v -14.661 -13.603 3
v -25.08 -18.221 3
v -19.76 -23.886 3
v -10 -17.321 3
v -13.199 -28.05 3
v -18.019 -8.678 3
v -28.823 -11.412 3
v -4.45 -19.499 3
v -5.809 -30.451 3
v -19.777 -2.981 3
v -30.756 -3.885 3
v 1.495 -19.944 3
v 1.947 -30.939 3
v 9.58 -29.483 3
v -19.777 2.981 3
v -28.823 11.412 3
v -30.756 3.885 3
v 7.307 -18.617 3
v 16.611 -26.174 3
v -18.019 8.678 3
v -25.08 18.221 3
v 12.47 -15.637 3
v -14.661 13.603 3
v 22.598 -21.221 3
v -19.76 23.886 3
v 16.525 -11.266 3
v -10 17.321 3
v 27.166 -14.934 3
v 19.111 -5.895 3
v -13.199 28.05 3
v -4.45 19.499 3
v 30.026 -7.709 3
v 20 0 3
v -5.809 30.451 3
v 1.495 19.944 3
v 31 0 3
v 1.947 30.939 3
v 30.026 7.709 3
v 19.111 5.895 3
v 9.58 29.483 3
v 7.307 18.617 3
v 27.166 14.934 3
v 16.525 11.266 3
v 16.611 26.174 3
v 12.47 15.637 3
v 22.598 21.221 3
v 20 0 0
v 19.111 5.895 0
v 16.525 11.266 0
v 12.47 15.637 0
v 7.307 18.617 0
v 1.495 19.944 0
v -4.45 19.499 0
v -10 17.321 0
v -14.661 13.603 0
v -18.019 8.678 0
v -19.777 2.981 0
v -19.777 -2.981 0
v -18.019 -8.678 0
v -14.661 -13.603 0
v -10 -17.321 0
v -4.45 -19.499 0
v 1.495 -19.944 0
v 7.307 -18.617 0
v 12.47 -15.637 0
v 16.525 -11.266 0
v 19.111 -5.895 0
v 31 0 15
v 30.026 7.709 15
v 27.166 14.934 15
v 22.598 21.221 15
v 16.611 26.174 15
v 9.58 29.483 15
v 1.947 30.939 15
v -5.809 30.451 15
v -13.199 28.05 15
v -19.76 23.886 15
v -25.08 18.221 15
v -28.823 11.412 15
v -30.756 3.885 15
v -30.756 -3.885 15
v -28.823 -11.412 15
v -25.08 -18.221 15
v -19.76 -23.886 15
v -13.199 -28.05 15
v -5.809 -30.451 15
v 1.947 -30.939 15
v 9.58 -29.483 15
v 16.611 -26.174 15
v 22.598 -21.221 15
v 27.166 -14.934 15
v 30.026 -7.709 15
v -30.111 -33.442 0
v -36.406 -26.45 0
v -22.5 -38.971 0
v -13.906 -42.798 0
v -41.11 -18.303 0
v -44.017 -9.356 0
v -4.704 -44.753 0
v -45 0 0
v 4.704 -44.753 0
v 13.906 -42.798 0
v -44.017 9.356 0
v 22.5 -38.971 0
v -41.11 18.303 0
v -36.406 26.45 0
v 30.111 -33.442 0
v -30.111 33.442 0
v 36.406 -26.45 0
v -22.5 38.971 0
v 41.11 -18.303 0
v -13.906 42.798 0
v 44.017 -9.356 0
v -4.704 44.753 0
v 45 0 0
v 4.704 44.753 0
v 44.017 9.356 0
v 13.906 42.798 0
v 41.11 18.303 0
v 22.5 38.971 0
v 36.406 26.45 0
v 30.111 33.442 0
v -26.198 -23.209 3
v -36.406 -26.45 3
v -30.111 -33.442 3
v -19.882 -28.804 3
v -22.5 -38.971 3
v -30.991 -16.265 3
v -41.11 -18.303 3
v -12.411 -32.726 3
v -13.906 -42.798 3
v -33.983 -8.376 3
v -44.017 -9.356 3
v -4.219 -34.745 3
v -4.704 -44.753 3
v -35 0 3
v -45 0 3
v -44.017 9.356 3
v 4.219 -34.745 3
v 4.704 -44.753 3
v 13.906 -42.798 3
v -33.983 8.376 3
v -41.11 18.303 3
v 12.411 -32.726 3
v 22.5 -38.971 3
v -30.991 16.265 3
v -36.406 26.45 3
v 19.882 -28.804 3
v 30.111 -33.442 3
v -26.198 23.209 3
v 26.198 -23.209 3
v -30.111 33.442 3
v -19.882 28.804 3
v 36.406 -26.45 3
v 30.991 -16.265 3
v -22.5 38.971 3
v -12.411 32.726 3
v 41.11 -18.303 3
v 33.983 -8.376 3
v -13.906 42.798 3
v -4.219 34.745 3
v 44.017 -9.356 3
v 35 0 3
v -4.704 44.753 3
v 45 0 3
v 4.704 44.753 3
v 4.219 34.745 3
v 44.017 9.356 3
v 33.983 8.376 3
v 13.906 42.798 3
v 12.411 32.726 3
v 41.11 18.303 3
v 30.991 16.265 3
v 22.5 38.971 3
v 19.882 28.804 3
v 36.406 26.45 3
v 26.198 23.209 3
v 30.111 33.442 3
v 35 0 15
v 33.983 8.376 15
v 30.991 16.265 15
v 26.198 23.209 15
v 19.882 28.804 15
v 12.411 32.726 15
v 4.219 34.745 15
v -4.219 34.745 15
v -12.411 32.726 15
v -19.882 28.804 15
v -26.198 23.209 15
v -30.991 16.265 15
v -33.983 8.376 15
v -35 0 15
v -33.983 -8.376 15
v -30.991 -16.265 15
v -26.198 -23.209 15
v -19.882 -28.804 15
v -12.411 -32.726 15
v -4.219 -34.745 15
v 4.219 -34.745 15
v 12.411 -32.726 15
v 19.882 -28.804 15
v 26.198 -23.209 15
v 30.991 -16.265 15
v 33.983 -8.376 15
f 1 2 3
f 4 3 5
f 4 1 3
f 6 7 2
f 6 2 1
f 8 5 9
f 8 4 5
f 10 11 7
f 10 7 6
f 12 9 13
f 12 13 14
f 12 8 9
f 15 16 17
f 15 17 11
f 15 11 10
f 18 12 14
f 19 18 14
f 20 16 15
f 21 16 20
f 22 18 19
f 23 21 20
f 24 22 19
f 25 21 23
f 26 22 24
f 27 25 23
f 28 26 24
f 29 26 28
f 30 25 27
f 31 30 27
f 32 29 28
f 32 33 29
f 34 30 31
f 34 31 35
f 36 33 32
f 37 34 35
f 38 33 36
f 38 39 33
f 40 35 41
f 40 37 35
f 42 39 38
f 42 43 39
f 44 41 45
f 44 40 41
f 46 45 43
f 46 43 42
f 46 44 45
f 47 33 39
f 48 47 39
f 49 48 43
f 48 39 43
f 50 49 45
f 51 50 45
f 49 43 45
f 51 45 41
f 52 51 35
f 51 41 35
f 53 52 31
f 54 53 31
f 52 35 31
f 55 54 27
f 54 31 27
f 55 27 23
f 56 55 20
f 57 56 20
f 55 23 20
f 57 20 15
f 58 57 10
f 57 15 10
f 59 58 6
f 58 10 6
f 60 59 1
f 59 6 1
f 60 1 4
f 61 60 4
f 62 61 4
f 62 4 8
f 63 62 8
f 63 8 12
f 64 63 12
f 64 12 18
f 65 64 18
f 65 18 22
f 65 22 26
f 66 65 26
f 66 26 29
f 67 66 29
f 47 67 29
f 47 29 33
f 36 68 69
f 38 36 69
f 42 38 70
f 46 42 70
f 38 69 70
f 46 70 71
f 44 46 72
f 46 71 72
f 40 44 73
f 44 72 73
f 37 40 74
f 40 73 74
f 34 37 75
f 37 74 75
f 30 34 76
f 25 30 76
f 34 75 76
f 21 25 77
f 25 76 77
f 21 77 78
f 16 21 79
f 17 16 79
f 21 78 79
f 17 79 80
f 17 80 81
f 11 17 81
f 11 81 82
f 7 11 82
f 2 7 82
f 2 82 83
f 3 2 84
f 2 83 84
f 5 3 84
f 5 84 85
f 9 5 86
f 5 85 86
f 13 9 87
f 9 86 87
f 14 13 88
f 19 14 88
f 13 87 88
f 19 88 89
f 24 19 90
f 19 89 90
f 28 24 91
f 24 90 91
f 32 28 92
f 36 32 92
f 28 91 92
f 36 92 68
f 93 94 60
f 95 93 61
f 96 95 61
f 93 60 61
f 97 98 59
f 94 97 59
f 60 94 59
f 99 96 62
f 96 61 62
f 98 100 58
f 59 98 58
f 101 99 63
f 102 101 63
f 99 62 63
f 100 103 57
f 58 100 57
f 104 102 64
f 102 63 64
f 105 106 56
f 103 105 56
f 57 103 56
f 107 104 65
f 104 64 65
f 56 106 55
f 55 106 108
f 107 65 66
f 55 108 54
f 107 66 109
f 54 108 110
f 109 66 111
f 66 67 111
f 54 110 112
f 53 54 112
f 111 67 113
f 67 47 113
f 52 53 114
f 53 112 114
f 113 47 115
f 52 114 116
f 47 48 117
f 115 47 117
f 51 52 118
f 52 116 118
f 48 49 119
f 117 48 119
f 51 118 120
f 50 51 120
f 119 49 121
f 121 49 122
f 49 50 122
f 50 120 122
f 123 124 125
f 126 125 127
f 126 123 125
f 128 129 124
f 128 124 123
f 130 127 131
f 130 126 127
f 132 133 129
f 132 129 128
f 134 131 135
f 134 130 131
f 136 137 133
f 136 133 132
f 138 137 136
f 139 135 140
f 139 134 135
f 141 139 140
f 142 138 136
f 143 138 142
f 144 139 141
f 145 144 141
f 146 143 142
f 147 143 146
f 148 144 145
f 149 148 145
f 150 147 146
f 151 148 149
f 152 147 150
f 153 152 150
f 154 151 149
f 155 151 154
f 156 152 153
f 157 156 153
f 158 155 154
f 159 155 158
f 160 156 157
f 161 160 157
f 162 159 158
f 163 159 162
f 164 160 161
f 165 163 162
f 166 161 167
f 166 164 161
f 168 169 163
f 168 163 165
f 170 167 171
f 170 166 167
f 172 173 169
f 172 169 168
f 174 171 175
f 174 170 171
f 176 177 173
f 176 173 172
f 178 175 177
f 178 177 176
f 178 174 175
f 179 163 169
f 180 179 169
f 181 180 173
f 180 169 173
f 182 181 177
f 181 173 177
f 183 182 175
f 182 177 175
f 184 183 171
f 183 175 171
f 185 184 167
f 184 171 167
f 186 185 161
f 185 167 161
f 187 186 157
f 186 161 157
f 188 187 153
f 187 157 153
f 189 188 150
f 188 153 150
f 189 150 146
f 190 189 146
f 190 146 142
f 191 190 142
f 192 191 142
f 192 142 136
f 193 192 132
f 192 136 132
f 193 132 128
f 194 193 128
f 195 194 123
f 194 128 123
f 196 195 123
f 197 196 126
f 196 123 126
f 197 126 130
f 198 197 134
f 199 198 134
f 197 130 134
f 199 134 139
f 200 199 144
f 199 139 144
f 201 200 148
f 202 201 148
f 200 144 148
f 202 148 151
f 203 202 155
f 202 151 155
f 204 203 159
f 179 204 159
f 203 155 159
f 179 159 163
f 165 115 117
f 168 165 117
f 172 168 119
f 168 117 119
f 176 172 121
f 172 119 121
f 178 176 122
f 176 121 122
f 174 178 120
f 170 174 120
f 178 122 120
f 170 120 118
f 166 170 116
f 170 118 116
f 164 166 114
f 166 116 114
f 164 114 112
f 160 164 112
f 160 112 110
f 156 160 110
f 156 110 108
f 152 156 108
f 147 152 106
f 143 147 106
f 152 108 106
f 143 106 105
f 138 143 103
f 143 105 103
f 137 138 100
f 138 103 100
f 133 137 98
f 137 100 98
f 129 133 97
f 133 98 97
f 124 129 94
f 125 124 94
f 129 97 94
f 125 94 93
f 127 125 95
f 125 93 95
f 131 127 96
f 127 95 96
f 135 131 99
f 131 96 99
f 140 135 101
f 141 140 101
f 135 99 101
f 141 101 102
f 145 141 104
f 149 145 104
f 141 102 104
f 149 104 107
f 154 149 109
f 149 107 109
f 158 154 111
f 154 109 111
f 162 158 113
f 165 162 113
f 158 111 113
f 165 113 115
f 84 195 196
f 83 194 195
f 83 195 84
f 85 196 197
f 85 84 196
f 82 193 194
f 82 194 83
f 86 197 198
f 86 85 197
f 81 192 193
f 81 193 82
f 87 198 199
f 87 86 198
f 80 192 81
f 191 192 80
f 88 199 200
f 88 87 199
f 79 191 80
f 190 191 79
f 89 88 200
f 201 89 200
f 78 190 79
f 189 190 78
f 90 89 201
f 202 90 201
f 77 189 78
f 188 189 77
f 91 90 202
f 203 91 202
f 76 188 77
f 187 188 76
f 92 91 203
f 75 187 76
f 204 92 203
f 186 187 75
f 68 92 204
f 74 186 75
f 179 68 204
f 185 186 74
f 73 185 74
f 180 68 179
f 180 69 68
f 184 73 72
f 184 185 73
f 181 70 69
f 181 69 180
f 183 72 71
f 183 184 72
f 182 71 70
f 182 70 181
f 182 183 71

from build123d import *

# Parameters (mm, degrees)
SKETCH1_R           = 45
BOSS_EXTRUDE3_DEPTH = 3
SKETCH2_R           = 35
BOSS_EXTRUDE4_DEPTH = 12
SKETCH3_R           = 31
CUT_EXTRUDE2_DEPTH  = 12
SKETCH4_R           = 20
CUT_EXTRUDE3_DEPTH  = 8


with BuildPart() as part:
    # Sketch1 → Boss-Extrude3 (new body)
    with BuildSketch(Plane.XY):
        Circle(SKETCH1_R)
    extrude(amount=BOSS_EXTRUDE3_DEPTH)

    # Sketch2 → Boss-Extrude4 (add)
    with BuildSketch(Plane.XY.offset(3)):
        Circle(SKETCH2_R)
    extrude(amount=BOSS_EXTRUDE4_DEPTH)

    # Sketch3 → Cut-Extrude2 (cut)
    with BuildSketch(Plane.XY.offset(15)):
        Circle(SKETCH3_R)
    extrude(amount=-CUT_EXTRUDE2_DEPTH, mode=Mode.SUBTRACT)

    # Sketch4 → Cut-Extrude3 (cut)
    with BuildSketch(Plane.XY.offset(3)):
        Circle(SKETCH4_R)
    extrude(amount=-CUT_EXTRUDE3_DEPTH, mode=Mode.SUBTRACT)


solid = part.part
